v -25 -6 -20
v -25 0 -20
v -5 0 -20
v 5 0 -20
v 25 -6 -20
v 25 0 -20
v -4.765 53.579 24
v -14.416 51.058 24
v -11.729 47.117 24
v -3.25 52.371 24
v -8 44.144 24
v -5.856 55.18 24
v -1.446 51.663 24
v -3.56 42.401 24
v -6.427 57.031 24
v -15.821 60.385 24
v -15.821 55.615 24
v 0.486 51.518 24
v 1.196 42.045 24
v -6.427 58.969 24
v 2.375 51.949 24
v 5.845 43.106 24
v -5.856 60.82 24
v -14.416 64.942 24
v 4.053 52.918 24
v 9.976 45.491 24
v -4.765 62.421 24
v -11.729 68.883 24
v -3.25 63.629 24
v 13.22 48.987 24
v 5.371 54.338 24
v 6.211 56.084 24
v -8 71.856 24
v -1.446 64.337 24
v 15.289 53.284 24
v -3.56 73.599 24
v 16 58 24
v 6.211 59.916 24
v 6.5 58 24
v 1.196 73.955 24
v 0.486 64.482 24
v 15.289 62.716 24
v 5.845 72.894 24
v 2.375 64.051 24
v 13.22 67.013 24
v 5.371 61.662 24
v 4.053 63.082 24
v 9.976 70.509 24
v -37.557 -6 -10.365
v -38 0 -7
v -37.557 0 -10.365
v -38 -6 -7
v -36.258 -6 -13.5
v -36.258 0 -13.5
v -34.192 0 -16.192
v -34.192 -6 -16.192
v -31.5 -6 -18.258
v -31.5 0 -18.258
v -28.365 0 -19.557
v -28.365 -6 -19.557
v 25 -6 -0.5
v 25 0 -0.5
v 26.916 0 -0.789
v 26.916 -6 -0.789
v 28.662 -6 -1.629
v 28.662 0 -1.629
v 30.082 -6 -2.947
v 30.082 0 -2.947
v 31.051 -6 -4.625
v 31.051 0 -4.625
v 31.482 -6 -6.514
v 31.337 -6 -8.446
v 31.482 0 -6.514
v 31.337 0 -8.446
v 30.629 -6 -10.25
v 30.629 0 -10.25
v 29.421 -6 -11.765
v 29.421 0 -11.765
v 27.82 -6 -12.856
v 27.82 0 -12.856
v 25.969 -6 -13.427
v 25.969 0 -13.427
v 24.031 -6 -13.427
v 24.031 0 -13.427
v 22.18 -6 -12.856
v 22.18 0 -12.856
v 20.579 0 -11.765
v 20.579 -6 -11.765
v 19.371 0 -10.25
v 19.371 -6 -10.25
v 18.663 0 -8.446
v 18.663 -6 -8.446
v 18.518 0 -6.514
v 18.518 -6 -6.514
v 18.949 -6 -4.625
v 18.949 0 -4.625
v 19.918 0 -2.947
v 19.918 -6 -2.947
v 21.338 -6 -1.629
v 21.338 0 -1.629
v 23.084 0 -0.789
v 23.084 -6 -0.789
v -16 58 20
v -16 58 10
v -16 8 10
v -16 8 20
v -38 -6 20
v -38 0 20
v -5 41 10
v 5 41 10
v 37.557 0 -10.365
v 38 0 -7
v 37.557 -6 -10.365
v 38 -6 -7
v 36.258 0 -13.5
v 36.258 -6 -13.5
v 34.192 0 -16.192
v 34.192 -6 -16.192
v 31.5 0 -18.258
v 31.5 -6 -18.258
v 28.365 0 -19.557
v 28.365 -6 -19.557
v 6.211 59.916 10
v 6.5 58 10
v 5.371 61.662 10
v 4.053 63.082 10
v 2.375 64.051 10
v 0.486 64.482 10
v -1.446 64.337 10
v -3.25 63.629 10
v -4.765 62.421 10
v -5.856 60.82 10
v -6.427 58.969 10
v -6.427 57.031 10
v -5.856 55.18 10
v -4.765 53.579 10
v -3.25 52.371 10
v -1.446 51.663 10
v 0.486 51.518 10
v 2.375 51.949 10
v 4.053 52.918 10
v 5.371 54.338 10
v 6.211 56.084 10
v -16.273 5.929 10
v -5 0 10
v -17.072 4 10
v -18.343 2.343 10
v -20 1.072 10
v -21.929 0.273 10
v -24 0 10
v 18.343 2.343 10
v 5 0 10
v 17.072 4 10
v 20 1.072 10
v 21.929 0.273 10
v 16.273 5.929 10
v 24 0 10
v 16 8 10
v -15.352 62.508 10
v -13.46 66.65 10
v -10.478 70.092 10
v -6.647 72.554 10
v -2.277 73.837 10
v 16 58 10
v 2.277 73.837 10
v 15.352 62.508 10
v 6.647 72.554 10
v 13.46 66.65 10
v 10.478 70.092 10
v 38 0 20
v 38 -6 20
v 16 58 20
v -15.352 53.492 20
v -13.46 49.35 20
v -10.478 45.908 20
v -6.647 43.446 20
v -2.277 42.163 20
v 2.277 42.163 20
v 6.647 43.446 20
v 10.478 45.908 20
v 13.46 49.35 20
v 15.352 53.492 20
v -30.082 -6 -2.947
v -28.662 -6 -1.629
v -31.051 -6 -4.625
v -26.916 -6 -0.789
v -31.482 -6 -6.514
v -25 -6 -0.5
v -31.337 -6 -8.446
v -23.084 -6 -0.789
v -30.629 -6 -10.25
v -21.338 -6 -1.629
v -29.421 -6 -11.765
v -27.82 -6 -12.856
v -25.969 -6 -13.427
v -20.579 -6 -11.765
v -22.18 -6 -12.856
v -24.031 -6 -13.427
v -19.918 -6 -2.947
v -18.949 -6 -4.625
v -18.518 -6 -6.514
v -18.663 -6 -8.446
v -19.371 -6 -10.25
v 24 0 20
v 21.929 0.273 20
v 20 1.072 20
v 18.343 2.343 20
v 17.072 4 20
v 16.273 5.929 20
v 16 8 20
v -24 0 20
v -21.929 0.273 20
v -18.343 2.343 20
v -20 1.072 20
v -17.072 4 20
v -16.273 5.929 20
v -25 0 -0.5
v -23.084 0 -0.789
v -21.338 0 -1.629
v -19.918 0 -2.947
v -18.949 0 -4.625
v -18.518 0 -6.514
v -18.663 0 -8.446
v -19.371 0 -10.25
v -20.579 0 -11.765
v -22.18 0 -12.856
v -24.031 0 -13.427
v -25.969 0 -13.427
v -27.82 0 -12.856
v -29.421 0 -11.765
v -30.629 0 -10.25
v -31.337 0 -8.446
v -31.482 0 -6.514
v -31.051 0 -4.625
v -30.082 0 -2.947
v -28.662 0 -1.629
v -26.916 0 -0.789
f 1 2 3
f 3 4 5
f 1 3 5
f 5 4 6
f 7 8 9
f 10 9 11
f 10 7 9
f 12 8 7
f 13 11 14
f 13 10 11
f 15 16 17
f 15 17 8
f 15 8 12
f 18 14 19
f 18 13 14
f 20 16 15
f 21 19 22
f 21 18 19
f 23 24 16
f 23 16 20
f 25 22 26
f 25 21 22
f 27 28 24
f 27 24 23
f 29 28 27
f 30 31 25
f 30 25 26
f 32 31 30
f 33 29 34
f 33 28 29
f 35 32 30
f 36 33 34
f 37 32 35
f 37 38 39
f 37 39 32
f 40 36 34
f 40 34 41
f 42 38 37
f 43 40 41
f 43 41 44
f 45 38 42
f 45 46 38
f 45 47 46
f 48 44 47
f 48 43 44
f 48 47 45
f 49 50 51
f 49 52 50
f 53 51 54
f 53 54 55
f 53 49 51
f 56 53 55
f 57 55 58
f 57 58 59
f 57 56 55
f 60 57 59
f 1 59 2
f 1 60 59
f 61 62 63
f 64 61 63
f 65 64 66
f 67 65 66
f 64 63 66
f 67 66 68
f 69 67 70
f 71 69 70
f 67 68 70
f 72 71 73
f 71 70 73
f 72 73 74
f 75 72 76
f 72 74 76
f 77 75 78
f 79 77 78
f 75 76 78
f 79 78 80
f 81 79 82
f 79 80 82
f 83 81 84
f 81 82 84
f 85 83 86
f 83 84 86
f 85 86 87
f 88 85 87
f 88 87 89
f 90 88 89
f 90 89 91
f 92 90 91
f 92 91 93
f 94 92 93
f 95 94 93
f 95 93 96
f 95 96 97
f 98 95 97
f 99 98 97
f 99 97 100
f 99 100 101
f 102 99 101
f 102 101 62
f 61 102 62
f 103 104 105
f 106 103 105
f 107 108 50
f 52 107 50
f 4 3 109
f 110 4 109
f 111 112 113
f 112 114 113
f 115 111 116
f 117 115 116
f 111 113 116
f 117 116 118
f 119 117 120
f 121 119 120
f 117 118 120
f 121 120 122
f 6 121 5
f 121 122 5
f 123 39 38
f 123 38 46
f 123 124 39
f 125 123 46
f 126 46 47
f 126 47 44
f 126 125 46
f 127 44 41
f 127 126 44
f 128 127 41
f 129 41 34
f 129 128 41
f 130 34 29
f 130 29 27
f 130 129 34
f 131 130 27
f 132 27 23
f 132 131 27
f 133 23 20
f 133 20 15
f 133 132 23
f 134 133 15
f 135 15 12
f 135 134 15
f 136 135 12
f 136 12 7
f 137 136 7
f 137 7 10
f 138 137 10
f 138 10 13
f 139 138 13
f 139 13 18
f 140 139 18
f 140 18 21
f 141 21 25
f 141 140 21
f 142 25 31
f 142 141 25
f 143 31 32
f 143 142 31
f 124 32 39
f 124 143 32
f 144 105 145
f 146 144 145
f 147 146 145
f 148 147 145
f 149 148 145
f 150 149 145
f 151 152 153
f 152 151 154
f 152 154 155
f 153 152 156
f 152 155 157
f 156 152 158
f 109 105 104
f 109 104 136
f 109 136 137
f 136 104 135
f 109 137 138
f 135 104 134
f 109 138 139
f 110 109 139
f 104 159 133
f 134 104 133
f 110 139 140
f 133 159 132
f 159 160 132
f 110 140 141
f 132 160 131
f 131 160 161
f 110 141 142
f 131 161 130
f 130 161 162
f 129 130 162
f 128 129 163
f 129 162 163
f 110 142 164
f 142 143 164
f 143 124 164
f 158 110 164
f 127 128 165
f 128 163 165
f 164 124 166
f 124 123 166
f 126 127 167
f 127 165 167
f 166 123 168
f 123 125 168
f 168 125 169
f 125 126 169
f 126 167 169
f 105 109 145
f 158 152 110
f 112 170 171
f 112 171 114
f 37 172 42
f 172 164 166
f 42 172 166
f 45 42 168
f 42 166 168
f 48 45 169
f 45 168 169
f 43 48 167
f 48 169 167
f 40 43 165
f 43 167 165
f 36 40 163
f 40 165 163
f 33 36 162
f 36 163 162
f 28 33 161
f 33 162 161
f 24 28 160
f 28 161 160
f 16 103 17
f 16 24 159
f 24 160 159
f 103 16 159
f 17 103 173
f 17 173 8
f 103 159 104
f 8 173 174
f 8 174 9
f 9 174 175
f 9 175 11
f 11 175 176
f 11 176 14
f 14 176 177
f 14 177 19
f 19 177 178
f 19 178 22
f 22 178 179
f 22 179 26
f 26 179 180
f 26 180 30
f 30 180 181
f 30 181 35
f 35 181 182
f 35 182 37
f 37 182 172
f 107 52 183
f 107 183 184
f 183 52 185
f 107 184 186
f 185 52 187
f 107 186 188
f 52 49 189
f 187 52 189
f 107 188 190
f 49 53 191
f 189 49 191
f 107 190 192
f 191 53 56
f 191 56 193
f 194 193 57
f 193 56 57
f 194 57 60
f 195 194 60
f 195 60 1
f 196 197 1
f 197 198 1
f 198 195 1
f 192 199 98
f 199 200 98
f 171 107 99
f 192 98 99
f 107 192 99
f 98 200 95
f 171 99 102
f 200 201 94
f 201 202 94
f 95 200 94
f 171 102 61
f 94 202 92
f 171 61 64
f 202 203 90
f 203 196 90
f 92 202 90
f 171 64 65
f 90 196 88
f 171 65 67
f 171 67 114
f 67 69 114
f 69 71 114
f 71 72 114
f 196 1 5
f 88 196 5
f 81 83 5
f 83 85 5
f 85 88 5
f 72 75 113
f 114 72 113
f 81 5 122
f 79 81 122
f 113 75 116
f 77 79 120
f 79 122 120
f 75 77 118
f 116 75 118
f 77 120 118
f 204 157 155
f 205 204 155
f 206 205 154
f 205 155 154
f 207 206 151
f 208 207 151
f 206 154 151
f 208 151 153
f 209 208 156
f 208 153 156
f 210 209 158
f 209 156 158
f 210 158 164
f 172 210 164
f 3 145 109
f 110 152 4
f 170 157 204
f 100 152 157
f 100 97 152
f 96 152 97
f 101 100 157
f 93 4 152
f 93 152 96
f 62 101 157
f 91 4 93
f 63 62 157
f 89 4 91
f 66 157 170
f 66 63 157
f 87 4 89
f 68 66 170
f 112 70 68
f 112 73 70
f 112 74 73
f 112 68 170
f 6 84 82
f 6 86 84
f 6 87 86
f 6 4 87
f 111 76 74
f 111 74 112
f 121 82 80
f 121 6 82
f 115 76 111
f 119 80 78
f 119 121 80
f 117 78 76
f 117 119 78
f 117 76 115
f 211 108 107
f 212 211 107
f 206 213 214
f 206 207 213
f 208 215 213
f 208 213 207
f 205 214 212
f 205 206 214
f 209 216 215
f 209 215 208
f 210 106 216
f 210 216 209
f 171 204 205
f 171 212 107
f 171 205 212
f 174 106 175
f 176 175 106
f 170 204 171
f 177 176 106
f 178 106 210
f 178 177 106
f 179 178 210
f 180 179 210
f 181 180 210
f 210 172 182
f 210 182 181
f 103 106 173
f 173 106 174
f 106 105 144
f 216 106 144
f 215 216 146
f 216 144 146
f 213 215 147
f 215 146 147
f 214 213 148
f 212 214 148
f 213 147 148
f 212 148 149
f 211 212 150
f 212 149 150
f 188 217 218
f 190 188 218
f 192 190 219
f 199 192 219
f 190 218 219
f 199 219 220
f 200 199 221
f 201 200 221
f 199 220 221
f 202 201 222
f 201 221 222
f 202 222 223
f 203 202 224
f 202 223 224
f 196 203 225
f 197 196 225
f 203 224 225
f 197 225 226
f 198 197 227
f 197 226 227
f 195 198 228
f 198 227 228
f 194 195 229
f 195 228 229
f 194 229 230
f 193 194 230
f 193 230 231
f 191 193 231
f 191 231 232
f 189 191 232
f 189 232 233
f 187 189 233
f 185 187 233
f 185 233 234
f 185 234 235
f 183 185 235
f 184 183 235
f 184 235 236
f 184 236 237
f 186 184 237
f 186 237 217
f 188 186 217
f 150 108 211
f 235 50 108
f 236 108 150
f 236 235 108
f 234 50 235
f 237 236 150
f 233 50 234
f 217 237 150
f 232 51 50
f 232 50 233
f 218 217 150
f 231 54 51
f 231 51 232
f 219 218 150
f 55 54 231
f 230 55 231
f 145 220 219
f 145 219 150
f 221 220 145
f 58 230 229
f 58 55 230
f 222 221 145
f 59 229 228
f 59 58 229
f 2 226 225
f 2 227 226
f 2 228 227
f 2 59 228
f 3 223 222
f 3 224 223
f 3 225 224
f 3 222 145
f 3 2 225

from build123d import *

# Parameters (mm, degrees)
SKETCH1_W               = 76
SKETCH1_H               = 40
BOSS_EXTRUDE1_DEPTH     = 6
BOSS_EXTRUDE2_START     = -10
BOSS_EXTRUDE2_OUTLINE_R = 6.5
BOSS_EXTRUDE2_DEPTH     = 10
SKETCH3_R               = 16
SKETCH3_R_2             = 6.5
BOSS_EXTRUDE3_DEPTH     = 4
SKETCH4_W               = 10
SKETCH4_H               = 41
BOSS_EXTRUDE4_DEPTH     = 30
CUT_EXTRUDE1_DEPTH      = 30
FILLET1_R               = 13
SKETCH6_R               = 6.5
CUT_EXTRUDE2_DEPTH      = 30


# Read off the part's stored shape, not the designer's step: Boss-Extrude2
with BuildPart() as part:
    # Sketch1 → Boss-Extrude1 (new body)
    with BuildSketch(Plane(origin=(0, 0, 0), x_dir=(1, 0, 0), z_dir=(0, 1, 0))):
        Rectangle(SKETCH1_W, SKETCH1_H)
    extrude(amount=-BOSS_EXTRUDE1_DEPTH)

    # Boss-Extrude2 outline → Boss-Extrude2 (add)
    with BuildSketch(Plane.XY.offset(20).offset(BOSS_EXTRUDE2_START)):
        with BuildLine():
            ThreePointArc((-16, 8), (-18.343145751, 2.343145751), (-24, 0))
            Line((-24, 0), (24, 0))
            ThreePointArc((24, 0), (18.343145751, 2.343145751), (16, 8))
            Line((16, 8), (16, 58))
            ThreePointArc((16, 58), (0, 74), (-16, 58))
            Line((-16, 58), (-16, 8))
        make_face()
        with Locations((0, 58)):
            Circle(BOSS_EXTRUDE2_OUTLINE_R, mode=Mode.SUBTRACT)
    extrude(amount=BOSS_EXTRUDE2_DEPTH)

    # Sketch3 → Boss-Extrude3 (add)
    with BuildSketch(Plane.XY.offset(20)):
        with Locations((0, 58)):
            Circle(SKETCH3_R)
        with Locations((0, 58)):
            Circle(SKETCH3_R_2, mode=Mode.SUBTRACT)
    extrude(amount=BOSS_EXTRUDE3_DEPTH)

    # Sketch4 → Boss-Extrude4 (add)
    with BuildSketch(Plane(origin=(0, 0, 10), x_dir=(-1, 0, 0), z_dir=(0, 0, -1))):
        with Locations((0, 20.5)):
            Rectangle(SKETCH4_W, SKETCH4_H)
    extrude(amount=BOSS_EXTRUDE4_DEPTH)

    # Sketch5 → Cut-Extrude1 (cut)
    with BuildSketch(Plane.ZY.offset(5)):
        Polygon((-20, 0), (10, 41), (-20, 41), align=None)
    extrude(amount=-CUT_EXTRUDE1_DEPTH, mode=Mode.SUBTRACT)

    # Fillet1
    fillet1_edges = [part.edges().sort_by_distance(p)[0] for p in [
        (-38, -3, -20),
        (38, -3, -20),
    ]]
    fillet(fillet1_edges, radius=FILLET1_R)

    # Sketch6 → Cut-Extrude2 (cut)
    with BuildSketch(Plane(origin=(0, 0, 0), x_dir=(1, 0, 0), z_dir=(0, 1, 0))):
        with Locations(Location((25, 7, 0), (0, 0, 270))):
            Circle(SKETCH6_R)
        with Locations(Location((-25, 7, 0), (0, 0, 270))):
            Circle(SKETCH6_R)
    extrude(amount=-CUT_EXTRUDE2_DEPTH, mode=Mode.SUBTRACT)


solid = part.part
